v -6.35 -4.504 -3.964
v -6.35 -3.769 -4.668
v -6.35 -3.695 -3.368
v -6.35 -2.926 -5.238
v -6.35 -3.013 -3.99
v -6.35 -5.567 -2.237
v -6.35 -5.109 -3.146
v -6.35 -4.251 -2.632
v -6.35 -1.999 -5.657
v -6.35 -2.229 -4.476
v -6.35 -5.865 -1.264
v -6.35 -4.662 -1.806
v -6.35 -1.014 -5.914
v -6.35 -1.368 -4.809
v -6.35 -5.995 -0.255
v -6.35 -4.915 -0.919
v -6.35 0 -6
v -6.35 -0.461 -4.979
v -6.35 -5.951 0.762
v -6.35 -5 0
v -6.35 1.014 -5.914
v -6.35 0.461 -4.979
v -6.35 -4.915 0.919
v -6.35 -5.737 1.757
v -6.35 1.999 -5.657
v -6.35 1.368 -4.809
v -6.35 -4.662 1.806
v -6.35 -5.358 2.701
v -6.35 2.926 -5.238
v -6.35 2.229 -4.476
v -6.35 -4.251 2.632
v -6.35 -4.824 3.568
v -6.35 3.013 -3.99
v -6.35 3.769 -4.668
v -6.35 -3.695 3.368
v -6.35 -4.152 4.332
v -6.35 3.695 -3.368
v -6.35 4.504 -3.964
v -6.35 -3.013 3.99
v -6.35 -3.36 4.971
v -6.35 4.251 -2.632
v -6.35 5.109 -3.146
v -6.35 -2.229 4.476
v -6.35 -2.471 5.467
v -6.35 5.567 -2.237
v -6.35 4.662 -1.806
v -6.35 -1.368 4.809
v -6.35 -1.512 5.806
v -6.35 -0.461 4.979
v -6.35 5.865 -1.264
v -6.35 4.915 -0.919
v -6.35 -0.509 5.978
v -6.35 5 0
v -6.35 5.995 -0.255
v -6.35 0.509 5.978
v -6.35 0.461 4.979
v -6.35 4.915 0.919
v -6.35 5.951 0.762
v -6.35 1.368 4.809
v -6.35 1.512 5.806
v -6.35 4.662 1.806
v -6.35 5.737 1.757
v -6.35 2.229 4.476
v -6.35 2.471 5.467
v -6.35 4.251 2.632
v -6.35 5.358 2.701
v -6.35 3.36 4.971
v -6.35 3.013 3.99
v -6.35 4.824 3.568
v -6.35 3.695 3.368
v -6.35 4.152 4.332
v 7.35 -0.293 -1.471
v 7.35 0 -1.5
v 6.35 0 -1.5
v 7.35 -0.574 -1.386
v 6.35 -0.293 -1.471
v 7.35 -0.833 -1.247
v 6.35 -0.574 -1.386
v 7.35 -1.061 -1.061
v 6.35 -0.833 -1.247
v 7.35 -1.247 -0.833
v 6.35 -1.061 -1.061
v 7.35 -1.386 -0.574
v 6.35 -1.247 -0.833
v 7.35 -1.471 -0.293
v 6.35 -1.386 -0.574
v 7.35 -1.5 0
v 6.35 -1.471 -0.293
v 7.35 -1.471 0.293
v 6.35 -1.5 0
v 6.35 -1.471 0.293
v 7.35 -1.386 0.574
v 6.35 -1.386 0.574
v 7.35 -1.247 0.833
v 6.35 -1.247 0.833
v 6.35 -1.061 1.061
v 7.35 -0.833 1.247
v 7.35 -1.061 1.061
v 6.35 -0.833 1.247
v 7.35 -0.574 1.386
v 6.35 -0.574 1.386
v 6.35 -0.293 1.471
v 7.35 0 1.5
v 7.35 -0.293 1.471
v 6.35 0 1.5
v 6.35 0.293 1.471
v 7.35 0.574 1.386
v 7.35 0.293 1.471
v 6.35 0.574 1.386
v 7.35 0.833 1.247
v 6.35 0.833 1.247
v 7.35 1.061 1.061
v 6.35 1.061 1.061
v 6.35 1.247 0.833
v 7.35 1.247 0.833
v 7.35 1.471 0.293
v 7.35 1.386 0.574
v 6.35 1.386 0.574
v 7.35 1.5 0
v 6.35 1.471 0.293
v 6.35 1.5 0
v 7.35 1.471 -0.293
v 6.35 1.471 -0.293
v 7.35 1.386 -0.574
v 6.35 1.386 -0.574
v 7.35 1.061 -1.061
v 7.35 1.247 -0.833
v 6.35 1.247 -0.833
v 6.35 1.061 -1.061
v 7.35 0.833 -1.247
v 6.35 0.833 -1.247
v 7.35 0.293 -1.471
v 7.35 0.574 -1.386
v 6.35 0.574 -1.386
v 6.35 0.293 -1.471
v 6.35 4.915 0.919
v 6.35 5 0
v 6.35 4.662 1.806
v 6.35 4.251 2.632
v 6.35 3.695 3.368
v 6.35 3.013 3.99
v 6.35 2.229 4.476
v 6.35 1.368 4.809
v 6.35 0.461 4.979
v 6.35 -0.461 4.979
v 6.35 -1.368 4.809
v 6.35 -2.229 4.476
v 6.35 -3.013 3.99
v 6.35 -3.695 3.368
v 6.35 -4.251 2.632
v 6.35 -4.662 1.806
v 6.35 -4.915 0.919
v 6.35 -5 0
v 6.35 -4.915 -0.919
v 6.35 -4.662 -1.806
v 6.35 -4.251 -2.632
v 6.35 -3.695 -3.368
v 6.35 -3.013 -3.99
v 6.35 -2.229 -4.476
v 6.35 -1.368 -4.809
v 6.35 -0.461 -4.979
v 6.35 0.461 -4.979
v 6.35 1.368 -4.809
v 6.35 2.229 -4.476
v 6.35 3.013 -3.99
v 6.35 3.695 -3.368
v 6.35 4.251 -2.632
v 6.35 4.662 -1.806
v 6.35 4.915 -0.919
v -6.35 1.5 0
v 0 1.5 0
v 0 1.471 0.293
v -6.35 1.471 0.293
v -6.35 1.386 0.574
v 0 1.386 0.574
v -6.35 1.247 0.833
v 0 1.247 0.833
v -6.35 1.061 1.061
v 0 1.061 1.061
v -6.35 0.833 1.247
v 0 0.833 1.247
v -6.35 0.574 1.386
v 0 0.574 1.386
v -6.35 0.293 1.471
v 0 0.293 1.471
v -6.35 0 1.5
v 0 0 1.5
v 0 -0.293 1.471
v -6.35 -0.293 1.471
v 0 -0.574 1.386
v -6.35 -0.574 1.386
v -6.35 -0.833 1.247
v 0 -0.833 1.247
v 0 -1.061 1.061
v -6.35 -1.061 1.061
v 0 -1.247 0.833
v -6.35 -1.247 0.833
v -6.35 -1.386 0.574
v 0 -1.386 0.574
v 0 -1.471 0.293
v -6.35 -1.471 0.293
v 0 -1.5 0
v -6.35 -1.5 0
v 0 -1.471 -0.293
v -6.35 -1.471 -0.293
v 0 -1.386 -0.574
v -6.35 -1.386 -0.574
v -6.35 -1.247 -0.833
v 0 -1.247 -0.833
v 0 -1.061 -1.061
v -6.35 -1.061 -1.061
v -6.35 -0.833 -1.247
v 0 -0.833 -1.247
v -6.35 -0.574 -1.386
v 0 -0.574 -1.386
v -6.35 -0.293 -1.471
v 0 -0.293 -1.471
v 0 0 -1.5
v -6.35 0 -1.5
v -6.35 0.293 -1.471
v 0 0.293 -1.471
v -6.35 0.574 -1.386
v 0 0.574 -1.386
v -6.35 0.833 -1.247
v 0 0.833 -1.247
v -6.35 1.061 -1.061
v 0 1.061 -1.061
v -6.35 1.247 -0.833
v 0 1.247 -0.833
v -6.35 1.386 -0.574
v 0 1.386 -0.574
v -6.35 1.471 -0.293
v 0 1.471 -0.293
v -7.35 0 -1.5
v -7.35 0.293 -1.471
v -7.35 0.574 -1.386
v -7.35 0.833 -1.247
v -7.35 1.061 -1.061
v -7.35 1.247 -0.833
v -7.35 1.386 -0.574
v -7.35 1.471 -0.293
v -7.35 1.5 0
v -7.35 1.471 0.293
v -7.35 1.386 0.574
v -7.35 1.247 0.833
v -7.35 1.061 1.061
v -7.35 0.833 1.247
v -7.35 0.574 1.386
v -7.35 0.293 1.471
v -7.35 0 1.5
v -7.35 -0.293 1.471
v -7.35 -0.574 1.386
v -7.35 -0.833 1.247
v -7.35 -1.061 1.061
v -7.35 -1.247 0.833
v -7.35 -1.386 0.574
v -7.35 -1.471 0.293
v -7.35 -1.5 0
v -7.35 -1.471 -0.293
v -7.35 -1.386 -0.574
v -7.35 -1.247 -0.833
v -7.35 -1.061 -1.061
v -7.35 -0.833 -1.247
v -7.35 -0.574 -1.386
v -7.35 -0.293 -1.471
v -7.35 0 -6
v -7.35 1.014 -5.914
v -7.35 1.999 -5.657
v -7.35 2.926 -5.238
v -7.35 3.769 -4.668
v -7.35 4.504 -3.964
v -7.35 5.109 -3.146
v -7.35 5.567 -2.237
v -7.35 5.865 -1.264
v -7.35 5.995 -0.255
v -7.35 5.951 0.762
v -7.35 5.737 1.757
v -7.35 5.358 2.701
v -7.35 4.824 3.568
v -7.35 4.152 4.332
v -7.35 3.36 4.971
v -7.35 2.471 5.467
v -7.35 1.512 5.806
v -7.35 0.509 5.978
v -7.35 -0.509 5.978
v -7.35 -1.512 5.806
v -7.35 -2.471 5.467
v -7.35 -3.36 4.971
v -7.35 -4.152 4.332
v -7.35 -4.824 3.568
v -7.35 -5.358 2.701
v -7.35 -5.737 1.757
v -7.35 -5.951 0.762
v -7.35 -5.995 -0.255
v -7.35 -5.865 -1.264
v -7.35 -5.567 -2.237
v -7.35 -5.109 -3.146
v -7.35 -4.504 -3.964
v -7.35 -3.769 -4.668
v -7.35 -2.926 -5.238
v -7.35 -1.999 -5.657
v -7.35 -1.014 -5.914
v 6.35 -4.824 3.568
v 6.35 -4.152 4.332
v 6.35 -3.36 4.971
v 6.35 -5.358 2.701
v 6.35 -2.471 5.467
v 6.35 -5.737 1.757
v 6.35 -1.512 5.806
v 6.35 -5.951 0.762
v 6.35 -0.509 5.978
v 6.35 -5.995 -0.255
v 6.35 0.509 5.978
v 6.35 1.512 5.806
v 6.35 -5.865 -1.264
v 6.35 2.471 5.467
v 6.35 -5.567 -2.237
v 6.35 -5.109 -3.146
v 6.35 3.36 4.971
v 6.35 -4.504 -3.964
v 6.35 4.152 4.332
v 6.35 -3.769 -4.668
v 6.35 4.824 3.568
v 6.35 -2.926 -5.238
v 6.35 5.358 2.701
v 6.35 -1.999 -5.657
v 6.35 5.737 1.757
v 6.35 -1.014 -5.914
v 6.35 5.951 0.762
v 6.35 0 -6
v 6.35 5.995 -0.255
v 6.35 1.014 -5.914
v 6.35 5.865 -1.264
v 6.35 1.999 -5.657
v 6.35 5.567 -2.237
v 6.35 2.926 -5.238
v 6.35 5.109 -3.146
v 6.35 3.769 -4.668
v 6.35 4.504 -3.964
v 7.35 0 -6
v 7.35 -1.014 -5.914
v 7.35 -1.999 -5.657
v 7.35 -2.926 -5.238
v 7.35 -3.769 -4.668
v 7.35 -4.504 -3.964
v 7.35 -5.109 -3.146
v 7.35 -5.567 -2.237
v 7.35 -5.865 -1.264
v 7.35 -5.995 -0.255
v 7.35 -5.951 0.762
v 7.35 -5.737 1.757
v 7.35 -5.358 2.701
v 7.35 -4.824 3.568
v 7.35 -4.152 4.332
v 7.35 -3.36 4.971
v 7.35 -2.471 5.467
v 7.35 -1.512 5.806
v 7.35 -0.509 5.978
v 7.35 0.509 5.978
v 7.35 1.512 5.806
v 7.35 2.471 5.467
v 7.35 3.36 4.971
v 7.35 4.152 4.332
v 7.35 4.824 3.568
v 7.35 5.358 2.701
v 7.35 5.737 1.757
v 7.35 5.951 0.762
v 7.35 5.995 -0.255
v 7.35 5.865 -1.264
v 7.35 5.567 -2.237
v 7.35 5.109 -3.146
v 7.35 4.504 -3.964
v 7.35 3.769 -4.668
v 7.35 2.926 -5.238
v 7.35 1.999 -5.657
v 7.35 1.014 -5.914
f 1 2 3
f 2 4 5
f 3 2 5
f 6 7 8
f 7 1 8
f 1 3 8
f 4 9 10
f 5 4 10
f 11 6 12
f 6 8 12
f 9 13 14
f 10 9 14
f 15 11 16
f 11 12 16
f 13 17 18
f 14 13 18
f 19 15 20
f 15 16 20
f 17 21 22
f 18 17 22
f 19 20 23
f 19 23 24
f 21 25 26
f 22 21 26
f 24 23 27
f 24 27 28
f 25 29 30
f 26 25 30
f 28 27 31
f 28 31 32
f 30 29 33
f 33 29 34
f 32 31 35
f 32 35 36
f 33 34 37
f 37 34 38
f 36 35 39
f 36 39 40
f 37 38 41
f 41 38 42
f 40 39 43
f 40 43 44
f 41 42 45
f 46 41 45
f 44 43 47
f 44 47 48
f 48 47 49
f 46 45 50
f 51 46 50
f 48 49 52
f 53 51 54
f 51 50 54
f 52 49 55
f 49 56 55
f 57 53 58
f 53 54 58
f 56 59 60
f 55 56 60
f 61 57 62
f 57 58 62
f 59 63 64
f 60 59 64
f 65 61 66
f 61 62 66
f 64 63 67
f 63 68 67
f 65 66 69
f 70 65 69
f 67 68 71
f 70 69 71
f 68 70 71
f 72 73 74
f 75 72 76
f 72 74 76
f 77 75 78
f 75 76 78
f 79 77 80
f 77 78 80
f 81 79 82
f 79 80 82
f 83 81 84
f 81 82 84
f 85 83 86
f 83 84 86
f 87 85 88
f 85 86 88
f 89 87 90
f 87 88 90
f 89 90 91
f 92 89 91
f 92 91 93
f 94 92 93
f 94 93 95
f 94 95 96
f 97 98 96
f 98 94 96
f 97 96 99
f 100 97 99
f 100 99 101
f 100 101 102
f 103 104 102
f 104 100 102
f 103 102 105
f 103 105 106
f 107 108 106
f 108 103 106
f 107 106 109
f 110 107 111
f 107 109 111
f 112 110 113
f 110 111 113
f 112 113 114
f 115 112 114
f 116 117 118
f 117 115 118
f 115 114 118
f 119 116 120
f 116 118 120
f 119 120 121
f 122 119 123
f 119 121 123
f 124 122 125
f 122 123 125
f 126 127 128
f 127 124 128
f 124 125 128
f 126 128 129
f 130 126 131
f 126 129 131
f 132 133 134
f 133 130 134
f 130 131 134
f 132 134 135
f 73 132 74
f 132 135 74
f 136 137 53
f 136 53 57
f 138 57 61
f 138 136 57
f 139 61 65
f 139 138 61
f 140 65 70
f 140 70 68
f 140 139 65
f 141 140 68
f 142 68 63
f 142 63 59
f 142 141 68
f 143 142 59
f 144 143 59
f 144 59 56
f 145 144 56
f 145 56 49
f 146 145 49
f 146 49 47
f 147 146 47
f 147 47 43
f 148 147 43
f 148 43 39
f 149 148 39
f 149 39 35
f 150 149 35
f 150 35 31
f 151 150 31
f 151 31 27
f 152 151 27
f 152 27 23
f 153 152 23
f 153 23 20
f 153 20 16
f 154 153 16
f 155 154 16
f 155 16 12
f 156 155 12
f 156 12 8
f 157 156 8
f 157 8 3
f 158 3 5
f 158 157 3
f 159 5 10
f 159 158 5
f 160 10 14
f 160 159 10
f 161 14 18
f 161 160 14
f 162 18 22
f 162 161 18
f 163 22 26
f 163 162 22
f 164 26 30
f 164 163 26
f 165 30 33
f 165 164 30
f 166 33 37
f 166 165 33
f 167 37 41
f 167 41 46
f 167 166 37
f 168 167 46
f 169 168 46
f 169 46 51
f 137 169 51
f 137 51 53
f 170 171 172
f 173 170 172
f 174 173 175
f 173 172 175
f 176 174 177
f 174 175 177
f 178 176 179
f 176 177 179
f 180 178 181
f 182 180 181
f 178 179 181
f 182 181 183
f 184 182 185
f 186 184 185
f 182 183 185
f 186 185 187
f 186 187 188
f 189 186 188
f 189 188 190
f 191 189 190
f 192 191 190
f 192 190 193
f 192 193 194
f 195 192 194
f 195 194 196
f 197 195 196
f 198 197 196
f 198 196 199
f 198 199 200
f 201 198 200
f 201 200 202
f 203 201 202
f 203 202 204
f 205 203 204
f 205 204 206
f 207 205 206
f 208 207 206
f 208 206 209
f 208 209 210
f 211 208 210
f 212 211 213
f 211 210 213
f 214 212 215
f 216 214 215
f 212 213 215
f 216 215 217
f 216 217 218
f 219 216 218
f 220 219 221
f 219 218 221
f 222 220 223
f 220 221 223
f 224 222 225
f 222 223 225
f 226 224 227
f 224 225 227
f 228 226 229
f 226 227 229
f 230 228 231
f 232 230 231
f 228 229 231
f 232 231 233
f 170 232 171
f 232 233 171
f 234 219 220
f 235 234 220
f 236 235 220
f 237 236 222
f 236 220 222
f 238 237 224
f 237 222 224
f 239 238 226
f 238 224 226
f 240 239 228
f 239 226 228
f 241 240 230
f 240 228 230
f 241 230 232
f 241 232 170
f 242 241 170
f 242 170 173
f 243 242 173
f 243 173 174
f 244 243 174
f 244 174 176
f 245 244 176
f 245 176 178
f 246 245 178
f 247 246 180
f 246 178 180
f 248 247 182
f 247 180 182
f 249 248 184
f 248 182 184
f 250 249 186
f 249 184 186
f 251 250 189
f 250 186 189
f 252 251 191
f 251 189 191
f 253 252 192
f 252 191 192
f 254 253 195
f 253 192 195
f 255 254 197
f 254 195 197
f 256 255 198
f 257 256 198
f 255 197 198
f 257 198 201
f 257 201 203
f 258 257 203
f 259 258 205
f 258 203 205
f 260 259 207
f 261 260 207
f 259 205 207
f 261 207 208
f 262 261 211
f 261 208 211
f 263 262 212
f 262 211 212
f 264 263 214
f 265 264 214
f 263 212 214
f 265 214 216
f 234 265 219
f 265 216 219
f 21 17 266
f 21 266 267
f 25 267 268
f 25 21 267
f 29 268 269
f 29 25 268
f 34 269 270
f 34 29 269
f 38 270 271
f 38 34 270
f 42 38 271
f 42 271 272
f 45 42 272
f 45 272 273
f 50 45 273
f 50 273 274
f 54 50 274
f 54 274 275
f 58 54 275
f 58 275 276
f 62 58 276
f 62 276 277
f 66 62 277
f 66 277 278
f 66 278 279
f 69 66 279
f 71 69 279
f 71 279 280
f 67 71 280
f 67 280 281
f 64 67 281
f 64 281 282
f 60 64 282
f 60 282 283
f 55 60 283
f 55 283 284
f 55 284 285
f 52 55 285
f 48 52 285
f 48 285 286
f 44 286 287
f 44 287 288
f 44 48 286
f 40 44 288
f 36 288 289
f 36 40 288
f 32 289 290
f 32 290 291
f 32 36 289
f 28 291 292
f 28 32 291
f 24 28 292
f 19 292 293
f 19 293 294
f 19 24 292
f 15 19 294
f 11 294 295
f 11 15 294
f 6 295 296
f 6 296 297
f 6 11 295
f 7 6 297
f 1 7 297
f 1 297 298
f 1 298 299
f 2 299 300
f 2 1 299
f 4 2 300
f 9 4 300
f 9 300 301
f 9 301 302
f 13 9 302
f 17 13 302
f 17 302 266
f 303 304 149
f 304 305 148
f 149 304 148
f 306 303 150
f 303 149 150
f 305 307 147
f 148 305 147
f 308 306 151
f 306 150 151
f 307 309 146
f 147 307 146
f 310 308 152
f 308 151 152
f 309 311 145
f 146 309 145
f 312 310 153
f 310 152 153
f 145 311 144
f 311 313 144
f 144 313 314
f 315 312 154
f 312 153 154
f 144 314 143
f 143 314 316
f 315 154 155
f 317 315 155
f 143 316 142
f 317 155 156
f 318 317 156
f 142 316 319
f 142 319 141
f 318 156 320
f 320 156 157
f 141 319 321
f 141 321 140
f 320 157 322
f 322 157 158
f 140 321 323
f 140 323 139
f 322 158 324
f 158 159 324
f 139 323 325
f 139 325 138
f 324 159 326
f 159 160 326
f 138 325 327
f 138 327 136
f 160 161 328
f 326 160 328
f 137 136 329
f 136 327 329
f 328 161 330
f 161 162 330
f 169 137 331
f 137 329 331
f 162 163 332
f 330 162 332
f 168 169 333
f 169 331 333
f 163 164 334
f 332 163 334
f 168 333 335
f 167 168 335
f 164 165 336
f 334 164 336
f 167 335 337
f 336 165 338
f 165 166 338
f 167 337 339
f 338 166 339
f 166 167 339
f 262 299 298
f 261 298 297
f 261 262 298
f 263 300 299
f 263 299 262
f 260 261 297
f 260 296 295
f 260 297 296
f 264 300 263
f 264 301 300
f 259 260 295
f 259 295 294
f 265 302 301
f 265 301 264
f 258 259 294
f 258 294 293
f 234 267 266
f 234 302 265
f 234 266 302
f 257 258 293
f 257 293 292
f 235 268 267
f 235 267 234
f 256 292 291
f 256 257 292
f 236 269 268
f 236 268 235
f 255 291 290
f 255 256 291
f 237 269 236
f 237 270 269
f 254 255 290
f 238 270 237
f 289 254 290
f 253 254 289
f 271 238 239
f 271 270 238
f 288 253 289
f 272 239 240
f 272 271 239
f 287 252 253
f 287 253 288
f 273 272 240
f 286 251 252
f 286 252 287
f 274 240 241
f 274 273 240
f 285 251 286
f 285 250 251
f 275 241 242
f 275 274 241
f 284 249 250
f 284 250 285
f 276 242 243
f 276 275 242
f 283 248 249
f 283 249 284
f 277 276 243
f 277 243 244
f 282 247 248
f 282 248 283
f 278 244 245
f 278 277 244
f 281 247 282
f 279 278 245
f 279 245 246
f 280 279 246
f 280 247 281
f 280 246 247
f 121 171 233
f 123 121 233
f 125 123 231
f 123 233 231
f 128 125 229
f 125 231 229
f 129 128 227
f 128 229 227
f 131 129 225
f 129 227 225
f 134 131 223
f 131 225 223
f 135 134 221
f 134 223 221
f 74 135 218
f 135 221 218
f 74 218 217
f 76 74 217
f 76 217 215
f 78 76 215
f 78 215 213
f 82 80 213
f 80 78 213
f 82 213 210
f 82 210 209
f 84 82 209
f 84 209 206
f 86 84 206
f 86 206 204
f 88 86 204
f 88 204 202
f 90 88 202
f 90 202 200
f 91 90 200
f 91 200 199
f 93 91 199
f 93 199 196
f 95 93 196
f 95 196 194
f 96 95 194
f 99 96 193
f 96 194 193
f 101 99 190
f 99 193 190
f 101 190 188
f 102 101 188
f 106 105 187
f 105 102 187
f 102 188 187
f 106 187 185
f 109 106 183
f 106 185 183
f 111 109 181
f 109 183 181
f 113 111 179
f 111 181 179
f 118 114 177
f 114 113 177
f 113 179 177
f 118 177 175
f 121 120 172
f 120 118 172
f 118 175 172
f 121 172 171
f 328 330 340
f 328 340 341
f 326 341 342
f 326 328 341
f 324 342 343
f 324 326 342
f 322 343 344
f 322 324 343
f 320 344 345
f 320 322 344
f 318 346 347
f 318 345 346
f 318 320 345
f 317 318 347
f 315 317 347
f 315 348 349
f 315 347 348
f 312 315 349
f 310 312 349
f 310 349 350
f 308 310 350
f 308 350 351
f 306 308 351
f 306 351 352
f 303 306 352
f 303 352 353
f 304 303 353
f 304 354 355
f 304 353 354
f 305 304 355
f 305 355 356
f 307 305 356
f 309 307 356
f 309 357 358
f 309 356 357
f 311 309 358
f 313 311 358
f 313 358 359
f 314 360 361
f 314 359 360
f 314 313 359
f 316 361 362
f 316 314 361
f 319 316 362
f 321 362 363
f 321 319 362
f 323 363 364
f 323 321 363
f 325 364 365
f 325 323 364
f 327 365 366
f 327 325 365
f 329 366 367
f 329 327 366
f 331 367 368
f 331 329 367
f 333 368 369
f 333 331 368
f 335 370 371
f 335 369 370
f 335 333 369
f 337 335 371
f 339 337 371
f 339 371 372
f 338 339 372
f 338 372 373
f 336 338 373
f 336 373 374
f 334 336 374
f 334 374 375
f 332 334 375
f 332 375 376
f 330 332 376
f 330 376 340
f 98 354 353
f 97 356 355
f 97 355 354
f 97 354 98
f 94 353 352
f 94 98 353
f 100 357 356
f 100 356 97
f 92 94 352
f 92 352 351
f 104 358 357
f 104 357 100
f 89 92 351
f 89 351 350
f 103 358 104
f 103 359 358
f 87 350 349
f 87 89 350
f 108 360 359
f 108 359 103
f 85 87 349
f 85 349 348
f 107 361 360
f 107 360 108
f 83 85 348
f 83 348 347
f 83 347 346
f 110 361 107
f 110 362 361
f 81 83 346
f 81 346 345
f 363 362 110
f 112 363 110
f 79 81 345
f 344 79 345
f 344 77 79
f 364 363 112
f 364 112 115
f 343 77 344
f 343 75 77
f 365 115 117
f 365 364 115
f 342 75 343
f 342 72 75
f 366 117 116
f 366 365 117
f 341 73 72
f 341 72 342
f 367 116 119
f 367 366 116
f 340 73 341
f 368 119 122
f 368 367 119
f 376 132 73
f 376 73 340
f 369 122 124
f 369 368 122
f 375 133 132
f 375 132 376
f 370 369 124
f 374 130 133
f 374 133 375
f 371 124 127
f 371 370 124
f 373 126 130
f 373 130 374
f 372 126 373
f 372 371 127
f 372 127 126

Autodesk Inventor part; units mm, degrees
ref_plane "YZ Plane" through (0, 0, 0) normal (1, 0, 0) x (0, 1, 0)
ref_plane "XZ Plane" through (0, 0, 0) normal (0, 1, 0) x (-1, 0, 0)
ref_plane "XY Plane" through (0, 0, 0) normal (0, 0, 1) x (1, 0, 0)
sketch "Sketch1" plane through (0, 0, 0) normal (1, 0, 0) x (0, 1, 0)
  circle A0 centre (0, 0) radius 1.5
  circle A1 centre (0, 0) radius 5
  dimension "d0" = 3
  dimension "d1" = 10
extrude "Extrusion1" add sketch "Sketch1" along normal mid plane 12.7
sketch "Sketch2" plane through (6.35, 0, 0) normal (1, 0, 0) x (0, 0, -1)
  circle A0 centre (0, 0) radius 6
  circle A1 centre (0, 0) radius 1.5
  dimension "d4" = 12
  dimension "d5" = 3
extrude "Extrusion2" add sketch "Sketch2" along normal blind 1
mirror "Mirror1" about plane through (0, 0, 0) normal (1, 0, 0) of "Extrusion2"
properties part number "HubV2"
